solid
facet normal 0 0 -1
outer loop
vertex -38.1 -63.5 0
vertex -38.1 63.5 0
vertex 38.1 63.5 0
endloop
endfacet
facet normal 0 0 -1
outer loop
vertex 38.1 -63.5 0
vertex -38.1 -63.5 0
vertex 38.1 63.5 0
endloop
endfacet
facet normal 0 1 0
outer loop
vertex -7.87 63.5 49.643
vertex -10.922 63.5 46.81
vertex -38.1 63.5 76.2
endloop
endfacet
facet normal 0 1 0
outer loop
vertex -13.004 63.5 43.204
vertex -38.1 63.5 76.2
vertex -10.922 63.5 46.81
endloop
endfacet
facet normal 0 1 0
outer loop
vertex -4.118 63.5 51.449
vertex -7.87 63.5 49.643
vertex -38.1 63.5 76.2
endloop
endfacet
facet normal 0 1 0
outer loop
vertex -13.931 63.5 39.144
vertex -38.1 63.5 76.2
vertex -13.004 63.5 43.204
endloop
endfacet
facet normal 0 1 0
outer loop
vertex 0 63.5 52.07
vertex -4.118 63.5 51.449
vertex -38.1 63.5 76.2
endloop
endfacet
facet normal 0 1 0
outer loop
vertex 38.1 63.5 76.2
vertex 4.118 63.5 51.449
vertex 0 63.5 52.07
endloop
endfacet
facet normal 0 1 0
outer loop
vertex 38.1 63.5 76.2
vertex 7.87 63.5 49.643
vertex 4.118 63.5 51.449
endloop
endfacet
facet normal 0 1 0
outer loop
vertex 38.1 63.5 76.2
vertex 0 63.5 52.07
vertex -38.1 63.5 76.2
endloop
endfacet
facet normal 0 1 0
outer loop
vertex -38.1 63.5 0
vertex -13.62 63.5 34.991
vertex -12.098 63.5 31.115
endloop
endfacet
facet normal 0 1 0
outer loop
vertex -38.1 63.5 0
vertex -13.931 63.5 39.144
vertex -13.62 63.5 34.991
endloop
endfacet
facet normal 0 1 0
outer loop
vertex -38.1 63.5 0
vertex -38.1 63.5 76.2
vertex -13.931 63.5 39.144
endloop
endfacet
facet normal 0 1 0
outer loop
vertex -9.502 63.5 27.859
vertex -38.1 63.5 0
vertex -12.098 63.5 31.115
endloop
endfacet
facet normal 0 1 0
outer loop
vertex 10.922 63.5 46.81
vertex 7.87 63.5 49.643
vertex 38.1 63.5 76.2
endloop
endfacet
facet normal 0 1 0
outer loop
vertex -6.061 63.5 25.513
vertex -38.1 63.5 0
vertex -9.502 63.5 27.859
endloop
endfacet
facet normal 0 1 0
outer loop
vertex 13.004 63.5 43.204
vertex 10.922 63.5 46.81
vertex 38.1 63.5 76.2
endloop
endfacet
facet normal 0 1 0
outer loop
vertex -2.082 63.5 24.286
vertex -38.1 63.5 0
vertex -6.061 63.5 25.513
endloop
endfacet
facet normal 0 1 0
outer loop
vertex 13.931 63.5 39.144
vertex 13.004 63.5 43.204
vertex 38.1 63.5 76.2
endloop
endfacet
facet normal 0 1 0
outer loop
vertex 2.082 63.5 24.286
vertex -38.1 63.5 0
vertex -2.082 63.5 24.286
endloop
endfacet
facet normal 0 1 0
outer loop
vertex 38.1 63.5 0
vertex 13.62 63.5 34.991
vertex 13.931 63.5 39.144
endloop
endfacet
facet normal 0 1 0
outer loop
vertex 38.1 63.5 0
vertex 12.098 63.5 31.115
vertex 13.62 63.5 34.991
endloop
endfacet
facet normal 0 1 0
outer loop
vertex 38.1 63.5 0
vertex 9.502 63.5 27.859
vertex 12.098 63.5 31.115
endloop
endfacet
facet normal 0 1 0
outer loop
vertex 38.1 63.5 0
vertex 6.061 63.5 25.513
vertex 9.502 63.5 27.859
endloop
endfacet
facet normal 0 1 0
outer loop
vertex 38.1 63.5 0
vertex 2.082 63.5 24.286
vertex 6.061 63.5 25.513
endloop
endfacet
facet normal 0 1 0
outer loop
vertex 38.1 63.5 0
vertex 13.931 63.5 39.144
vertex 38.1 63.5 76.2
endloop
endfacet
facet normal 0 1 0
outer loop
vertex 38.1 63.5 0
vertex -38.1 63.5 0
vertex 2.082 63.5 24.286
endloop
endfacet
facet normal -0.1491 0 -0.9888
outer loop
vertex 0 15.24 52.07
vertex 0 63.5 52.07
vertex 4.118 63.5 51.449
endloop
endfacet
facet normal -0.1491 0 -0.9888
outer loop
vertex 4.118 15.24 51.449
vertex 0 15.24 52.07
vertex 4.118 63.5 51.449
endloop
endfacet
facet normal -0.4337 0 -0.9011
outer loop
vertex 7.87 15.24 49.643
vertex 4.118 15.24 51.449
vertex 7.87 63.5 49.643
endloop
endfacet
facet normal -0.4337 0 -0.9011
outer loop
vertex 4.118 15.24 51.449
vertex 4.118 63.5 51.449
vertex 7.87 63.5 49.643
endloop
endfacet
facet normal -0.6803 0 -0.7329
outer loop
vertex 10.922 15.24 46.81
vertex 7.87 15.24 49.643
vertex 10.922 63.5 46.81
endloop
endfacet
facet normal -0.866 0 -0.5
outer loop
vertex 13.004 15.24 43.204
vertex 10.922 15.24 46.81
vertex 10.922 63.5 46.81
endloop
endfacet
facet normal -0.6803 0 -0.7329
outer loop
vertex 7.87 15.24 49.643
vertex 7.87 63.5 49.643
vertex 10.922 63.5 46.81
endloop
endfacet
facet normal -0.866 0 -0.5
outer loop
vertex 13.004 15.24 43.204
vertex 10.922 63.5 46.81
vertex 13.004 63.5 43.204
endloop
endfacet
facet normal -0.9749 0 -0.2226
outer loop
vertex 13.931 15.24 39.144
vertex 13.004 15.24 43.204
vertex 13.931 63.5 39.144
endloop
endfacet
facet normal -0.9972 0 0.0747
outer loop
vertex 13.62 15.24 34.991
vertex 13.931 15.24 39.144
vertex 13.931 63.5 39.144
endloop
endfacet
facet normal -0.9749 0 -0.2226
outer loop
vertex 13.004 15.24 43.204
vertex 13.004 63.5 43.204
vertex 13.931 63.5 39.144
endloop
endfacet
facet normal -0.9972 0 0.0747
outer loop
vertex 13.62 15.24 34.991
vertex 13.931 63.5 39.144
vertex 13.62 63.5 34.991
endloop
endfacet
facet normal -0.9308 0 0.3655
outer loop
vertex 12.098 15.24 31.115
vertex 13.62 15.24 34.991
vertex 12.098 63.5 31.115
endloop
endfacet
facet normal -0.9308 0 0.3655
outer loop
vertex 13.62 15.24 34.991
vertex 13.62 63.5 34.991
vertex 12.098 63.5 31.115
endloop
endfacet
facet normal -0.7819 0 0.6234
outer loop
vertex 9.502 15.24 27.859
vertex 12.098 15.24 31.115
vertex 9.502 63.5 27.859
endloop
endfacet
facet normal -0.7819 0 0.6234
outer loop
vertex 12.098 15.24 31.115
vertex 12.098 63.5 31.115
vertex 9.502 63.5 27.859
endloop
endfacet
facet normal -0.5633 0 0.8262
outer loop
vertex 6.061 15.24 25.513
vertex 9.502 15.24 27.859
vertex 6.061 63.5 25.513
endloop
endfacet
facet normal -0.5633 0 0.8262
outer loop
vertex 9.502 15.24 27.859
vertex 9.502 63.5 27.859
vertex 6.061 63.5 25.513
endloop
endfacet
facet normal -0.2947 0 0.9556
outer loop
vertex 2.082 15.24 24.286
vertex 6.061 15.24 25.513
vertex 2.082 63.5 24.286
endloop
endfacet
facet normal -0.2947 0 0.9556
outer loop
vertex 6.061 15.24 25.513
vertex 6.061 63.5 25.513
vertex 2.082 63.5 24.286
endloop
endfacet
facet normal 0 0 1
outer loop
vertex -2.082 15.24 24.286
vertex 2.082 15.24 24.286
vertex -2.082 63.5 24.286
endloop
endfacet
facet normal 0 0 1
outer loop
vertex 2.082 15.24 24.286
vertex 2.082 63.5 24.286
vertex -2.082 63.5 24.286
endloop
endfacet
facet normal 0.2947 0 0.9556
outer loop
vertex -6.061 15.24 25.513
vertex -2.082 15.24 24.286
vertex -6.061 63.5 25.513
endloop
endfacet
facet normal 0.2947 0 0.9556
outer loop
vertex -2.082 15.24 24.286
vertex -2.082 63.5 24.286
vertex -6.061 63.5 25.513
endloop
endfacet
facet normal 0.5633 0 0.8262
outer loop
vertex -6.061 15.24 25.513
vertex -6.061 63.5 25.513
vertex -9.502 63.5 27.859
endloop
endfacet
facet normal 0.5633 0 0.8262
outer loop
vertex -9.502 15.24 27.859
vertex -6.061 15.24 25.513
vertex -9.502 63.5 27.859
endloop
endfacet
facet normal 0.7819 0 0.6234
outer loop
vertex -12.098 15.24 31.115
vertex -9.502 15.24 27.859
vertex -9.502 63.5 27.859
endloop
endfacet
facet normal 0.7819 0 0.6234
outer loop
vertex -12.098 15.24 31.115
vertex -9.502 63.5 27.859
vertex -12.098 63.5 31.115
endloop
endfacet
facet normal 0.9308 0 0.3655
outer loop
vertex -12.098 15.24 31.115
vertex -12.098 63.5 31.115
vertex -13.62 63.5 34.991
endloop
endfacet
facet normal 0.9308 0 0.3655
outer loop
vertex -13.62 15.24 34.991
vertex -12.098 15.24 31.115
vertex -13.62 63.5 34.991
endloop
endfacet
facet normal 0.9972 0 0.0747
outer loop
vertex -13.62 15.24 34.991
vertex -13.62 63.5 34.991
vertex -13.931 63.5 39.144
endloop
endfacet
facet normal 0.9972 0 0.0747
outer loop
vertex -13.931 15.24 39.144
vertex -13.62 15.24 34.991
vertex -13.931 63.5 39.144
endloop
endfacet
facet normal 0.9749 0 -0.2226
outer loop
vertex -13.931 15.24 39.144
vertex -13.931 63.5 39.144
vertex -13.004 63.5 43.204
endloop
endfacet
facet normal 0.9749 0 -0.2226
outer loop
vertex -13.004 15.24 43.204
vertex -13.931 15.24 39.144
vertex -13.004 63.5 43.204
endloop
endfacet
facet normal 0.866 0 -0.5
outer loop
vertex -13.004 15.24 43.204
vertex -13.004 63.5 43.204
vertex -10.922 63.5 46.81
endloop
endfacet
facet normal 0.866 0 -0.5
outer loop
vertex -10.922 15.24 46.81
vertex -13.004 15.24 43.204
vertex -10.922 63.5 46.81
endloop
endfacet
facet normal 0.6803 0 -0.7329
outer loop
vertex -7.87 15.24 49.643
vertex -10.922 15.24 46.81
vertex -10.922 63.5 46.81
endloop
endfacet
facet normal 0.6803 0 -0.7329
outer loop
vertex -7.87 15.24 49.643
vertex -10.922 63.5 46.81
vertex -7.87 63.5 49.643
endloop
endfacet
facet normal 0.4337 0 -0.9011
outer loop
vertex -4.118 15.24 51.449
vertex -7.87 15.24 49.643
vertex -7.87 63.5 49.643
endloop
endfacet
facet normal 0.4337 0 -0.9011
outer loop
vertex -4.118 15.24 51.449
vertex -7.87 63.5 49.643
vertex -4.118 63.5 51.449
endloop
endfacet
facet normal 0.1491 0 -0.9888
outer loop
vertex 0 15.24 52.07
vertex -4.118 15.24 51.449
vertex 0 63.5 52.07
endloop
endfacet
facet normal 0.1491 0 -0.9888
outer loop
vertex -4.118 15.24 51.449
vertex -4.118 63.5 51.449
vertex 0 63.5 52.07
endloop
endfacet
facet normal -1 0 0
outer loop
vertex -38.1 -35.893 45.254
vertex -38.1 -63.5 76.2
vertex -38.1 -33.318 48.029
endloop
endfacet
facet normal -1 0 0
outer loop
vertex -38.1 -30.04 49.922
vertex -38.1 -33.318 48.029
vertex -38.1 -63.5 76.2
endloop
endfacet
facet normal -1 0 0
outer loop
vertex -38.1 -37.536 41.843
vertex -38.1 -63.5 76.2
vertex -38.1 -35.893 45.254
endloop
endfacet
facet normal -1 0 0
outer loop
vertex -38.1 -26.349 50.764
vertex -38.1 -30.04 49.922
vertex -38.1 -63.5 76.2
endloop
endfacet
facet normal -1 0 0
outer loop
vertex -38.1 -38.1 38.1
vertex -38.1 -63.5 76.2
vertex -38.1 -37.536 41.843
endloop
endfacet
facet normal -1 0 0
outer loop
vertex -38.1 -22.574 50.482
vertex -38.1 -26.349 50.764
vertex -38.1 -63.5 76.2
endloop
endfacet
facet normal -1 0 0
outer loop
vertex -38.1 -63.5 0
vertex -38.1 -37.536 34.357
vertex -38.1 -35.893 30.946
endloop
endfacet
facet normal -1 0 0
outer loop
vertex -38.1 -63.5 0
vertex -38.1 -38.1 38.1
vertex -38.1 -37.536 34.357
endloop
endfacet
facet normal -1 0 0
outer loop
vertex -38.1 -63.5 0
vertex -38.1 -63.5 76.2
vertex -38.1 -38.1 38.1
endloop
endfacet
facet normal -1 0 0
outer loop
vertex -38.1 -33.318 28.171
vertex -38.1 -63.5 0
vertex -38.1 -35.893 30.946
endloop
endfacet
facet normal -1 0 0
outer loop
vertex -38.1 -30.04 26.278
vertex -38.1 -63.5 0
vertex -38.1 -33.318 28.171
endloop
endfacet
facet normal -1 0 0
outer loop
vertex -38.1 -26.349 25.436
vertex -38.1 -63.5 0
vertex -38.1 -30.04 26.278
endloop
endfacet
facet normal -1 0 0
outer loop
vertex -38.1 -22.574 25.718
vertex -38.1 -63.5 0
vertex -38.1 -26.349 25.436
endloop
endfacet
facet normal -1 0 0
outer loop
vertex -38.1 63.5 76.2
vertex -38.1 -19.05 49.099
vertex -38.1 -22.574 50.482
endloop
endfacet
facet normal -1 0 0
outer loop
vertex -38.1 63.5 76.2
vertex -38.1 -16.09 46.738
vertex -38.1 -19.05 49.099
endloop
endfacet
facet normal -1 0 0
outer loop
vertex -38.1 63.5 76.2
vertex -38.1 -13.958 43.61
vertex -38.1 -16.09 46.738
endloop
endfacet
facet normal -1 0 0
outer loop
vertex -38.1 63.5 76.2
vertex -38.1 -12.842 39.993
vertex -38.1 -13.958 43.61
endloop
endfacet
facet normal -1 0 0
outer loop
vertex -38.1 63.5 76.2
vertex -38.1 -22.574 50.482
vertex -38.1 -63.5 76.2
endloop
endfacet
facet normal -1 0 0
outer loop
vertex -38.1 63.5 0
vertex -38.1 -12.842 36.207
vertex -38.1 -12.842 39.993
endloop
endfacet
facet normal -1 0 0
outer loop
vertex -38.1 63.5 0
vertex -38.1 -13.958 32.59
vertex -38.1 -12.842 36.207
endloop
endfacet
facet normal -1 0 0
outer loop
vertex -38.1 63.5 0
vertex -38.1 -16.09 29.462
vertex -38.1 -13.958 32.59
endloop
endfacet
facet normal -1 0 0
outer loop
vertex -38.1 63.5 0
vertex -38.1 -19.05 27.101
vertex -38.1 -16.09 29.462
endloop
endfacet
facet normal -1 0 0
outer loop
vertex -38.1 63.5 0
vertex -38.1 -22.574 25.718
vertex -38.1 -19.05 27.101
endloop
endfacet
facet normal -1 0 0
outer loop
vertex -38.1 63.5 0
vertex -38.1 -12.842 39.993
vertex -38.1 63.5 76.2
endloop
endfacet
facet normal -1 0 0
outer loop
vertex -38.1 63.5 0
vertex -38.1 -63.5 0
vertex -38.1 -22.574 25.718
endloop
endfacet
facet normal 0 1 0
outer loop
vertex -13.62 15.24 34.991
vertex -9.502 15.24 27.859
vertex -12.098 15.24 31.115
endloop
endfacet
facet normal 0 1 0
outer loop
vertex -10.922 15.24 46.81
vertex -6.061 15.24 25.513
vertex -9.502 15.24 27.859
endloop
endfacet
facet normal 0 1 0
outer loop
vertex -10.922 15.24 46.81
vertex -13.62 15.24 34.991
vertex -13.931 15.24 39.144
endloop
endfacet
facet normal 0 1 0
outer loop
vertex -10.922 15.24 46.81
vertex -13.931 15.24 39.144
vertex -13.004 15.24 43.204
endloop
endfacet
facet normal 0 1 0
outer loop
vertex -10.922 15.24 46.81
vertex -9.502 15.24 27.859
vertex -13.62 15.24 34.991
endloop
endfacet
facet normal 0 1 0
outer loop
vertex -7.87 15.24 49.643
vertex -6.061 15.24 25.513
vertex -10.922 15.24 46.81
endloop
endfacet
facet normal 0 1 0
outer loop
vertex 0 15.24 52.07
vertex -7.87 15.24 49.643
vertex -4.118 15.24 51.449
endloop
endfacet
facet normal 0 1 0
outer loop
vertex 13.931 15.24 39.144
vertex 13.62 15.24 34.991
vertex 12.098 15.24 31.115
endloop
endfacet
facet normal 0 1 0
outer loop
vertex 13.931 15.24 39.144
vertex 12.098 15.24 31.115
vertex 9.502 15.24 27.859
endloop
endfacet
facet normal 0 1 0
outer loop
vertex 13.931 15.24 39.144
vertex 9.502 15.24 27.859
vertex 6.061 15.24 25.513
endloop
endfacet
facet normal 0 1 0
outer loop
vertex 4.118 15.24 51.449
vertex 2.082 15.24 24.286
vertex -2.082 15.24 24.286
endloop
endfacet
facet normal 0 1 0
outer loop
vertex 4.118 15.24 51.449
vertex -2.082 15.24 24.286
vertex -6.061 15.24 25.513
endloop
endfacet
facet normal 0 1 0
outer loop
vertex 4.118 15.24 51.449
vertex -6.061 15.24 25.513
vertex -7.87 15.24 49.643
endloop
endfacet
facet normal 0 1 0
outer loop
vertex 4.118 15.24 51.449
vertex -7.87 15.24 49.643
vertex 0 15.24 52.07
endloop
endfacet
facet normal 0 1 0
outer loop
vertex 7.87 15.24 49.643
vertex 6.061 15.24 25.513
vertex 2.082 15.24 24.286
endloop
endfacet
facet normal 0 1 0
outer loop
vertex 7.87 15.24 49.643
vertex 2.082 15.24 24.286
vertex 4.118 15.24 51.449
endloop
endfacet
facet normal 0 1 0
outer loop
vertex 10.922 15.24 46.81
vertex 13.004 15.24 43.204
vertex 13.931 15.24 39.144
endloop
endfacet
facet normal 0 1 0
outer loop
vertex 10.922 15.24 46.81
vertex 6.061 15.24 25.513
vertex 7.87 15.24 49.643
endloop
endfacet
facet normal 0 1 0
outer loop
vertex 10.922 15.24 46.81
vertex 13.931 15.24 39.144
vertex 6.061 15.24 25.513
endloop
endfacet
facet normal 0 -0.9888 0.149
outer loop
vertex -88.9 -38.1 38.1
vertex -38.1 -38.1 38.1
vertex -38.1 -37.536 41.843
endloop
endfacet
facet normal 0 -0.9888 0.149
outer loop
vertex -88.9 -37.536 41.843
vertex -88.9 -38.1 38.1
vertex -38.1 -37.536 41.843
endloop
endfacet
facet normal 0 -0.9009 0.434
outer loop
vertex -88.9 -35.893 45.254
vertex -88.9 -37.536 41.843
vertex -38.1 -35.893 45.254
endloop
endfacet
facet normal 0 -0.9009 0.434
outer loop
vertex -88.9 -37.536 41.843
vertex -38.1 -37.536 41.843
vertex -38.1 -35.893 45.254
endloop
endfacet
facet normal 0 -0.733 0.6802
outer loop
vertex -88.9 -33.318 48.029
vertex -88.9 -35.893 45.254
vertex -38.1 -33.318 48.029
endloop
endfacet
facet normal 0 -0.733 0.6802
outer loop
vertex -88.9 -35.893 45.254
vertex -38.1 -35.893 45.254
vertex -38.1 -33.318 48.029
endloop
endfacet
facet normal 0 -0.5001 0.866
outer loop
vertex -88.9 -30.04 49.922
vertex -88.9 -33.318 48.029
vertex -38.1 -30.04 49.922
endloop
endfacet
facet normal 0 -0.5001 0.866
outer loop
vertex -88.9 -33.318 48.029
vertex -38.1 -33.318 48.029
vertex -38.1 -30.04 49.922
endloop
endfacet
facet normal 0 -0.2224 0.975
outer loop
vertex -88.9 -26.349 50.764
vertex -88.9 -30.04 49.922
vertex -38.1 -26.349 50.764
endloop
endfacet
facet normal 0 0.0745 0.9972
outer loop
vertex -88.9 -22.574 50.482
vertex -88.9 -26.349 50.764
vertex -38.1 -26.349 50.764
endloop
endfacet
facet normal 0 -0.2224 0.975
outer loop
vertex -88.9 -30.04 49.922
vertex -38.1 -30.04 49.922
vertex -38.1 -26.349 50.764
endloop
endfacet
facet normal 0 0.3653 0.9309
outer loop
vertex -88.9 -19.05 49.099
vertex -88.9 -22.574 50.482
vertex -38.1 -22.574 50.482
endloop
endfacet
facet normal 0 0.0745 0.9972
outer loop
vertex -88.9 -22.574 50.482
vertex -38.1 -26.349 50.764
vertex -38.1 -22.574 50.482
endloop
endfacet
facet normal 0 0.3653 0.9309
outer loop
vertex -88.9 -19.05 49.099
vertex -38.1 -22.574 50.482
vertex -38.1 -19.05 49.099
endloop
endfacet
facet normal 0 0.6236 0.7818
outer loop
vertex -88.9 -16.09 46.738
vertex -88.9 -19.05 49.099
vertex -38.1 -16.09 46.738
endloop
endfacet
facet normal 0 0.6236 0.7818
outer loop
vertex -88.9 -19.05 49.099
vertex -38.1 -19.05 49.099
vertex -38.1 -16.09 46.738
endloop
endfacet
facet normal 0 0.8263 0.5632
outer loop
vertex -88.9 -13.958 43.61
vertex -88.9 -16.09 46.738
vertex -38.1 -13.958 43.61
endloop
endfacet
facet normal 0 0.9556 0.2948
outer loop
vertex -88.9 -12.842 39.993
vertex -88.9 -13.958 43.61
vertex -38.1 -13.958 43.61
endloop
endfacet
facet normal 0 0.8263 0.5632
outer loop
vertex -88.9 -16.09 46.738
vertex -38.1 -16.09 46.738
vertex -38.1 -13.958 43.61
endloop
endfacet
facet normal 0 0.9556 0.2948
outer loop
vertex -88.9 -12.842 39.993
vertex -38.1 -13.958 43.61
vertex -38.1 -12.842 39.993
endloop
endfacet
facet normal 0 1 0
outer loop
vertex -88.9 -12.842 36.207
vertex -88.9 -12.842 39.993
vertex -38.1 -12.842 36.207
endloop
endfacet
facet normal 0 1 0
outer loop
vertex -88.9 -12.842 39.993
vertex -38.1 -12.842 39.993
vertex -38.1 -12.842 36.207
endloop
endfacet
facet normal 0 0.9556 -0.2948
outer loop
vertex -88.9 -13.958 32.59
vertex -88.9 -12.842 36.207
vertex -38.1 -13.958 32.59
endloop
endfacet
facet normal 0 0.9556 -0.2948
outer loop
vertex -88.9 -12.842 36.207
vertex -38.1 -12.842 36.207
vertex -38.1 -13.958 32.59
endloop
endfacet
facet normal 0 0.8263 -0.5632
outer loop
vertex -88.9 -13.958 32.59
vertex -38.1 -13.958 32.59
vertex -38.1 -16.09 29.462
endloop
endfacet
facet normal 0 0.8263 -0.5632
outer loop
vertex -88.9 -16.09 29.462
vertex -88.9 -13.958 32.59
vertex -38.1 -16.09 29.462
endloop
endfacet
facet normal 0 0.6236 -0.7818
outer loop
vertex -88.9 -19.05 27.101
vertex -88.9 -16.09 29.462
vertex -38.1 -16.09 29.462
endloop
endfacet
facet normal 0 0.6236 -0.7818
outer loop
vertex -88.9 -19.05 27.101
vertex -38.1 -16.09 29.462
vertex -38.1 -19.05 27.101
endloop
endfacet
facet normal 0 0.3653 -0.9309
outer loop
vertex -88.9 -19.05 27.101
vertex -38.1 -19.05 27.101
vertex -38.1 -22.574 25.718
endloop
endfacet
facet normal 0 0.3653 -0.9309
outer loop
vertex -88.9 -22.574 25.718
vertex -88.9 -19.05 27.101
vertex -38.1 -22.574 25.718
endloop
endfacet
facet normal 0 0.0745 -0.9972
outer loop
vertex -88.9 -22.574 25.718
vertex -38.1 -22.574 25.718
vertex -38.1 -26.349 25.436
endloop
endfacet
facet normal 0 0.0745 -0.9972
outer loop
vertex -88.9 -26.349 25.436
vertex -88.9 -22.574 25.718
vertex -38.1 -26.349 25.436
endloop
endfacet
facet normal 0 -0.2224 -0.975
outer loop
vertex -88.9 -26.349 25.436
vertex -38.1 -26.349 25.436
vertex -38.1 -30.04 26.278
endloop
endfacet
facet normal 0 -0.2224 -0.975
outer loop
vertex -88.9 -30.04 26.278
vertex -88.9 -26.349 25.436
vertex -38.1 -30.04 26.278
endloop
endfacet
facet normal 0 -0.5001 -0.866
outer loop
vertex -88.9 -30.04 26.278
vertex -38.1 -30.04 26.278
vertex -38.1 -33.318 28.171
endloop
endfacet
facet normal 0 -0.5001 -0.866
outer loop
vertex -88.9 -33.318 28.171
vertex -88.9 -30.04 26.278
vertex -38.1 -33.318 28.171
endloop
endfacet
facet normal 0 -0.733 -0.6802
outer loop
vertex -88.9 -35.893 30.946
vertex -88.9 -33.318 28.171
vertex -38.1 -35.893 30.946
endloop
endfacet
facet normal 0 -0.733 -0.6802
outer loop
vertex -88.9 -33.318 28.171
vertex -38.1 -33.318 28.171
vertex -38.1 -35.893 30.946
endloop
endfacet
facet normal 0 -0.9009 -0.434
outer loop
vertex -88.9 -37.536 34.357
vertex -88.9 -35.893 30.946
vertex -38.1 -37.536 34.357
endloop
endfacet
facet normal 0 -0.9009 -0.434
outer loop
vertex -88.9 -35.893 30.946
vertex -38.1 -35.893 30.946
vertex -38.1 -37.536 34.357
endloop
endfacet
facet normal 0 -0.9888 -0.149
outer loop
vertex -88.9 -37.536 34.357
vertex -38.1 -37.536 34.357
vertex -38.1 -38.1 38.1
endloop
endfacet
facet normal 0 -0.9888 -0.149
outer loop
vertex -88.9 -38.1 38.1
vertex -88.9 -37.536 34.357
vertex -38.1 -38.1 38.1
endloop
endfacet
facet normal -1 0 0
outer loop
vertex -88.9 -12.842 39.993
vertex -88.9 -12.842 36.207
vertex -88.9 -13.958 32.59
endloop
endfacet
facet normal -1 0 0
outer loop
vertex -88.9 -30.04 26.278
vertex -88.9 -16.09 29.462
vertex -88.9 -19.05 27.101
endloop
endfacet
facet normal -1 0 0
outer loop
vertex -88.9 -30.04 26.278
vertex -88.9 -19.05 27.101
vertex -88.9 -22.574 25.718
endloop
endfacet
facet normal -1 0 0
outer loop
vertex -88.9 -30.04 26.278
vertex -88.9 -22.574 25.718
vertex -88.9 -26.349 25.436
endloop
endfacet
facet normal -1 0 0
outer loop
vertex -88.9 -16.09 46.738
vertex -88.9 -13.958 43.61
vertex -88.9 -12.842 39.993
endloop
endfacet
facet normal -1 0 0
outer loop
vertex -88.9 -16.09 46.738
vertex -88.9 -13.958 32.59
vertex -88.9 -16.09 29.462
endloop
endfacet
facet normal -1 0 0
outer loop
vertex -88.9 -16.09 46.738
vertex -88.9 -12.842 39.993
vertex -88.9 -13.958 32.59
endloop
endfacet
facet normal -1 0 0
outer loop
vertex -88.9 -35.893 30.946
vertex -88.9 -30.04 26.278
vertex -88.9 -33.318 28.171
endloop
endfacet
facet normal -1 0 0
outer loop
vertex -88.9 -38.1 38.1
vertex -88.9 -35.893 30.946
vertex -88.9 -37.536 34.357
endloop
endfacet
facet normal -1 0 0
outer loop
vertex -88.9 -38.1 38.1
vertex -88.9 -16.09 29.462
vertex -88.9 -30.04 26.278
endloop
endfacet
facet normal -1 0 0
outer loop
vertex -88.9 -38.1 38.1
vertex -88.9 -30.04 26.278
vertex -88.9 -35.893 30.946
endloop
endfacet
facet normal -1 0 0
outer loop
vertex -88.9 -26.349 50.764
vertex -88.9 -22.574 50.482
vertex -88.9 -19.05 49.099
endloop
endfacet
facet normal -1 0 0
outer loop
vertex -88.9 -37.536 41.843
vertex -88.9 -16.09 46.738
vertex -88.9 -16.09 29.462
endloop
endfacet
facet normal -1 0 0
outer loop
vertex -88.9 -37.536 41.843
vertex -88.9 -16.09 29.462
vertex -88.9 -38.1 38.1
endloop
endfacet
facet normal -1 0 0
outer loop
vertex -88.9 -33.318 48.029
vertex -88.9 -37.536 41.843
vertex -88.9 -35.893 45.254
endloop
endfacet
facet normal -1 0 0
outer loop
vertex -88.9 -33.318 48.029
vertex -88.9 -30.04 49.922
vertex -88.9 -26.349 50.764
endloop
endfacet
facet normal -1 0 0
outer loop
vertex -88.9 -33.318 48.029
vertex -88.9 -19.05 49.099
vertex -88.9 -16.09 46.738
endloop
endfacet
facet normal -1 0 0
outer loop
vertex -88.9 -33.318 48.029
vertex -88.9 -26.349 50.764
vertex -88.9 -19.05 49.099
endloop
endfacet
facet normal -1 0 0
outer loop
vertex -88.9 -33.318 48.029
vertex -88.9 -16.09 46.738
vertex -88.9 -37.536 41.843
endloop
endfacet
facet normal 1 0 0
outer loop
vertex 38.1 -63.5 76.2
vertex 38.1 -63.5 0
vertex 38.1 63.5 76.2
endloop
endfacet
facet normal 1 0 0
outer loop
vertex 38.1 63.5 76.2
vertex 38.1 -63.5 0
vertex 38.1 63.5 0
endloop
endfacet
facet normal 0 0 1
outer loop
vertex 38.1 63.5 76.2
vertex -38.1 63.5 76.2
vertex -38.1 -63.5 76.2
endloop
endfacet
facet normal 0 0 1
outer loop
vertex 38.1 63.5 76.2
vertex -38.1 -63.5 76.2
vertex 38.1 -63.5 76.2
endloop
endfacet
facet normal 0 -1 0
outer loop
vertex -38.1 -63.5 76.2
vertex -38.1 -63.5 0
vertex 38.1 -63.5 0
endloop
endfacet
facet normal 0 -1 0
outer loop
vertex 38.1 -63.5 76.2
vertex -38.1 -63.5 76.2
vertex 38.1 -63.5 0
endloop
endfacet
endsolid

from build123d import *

# Parameters (mm, degrees)
SKETCH1_W           = 76.2
SKETCH1_H           = 127
BOSS_EXTRUDE1_DEPTH = 76.2
SKETCH2_R           = 13.97
CUT_EXTRUDE1_DEPTH  = 48.26
SKETCH3_R           = 12.7
BOSS_EXTRUDE2_DEPTH = 50.8


with BuildPart() as part:
    # Sketch1 → Boss-Extrude1 (new body)
    with BuildSketch(Plane.XY):
        Rectangle(SKETCH1_W, SKETCH1_H)
    extrude(amount=BOSS_EXTRUDE1_DEPTH)

    # Sketch2 → Cut-Extrude1 (cut)
    with BuildSketch(Plane(origin=(0, 63.5, 0), x_dir=(1, 0, 0), z_dir=(0, 1, 0))):
        with Locations(Location((0, -38.1, 0), (0, 0, 270))):
            Circle(SKETCH2_R)
    extrude(amount=-CUT_EXTRUDE1_DEPTH, mode=Mode.SUBTRACT)

    # Sketch3 → Boss-Extrude2 (add)
    with BuildSketch(Plane.ZY.offset(38.1)):
        with Locations(Location((38.1, -25.4, 0), (0, 0, 270))):
            Circle(SKETCH3_R)
    extrude(amount=BOSS_EXTRUDE2_DEPTH)


solid = part.part
